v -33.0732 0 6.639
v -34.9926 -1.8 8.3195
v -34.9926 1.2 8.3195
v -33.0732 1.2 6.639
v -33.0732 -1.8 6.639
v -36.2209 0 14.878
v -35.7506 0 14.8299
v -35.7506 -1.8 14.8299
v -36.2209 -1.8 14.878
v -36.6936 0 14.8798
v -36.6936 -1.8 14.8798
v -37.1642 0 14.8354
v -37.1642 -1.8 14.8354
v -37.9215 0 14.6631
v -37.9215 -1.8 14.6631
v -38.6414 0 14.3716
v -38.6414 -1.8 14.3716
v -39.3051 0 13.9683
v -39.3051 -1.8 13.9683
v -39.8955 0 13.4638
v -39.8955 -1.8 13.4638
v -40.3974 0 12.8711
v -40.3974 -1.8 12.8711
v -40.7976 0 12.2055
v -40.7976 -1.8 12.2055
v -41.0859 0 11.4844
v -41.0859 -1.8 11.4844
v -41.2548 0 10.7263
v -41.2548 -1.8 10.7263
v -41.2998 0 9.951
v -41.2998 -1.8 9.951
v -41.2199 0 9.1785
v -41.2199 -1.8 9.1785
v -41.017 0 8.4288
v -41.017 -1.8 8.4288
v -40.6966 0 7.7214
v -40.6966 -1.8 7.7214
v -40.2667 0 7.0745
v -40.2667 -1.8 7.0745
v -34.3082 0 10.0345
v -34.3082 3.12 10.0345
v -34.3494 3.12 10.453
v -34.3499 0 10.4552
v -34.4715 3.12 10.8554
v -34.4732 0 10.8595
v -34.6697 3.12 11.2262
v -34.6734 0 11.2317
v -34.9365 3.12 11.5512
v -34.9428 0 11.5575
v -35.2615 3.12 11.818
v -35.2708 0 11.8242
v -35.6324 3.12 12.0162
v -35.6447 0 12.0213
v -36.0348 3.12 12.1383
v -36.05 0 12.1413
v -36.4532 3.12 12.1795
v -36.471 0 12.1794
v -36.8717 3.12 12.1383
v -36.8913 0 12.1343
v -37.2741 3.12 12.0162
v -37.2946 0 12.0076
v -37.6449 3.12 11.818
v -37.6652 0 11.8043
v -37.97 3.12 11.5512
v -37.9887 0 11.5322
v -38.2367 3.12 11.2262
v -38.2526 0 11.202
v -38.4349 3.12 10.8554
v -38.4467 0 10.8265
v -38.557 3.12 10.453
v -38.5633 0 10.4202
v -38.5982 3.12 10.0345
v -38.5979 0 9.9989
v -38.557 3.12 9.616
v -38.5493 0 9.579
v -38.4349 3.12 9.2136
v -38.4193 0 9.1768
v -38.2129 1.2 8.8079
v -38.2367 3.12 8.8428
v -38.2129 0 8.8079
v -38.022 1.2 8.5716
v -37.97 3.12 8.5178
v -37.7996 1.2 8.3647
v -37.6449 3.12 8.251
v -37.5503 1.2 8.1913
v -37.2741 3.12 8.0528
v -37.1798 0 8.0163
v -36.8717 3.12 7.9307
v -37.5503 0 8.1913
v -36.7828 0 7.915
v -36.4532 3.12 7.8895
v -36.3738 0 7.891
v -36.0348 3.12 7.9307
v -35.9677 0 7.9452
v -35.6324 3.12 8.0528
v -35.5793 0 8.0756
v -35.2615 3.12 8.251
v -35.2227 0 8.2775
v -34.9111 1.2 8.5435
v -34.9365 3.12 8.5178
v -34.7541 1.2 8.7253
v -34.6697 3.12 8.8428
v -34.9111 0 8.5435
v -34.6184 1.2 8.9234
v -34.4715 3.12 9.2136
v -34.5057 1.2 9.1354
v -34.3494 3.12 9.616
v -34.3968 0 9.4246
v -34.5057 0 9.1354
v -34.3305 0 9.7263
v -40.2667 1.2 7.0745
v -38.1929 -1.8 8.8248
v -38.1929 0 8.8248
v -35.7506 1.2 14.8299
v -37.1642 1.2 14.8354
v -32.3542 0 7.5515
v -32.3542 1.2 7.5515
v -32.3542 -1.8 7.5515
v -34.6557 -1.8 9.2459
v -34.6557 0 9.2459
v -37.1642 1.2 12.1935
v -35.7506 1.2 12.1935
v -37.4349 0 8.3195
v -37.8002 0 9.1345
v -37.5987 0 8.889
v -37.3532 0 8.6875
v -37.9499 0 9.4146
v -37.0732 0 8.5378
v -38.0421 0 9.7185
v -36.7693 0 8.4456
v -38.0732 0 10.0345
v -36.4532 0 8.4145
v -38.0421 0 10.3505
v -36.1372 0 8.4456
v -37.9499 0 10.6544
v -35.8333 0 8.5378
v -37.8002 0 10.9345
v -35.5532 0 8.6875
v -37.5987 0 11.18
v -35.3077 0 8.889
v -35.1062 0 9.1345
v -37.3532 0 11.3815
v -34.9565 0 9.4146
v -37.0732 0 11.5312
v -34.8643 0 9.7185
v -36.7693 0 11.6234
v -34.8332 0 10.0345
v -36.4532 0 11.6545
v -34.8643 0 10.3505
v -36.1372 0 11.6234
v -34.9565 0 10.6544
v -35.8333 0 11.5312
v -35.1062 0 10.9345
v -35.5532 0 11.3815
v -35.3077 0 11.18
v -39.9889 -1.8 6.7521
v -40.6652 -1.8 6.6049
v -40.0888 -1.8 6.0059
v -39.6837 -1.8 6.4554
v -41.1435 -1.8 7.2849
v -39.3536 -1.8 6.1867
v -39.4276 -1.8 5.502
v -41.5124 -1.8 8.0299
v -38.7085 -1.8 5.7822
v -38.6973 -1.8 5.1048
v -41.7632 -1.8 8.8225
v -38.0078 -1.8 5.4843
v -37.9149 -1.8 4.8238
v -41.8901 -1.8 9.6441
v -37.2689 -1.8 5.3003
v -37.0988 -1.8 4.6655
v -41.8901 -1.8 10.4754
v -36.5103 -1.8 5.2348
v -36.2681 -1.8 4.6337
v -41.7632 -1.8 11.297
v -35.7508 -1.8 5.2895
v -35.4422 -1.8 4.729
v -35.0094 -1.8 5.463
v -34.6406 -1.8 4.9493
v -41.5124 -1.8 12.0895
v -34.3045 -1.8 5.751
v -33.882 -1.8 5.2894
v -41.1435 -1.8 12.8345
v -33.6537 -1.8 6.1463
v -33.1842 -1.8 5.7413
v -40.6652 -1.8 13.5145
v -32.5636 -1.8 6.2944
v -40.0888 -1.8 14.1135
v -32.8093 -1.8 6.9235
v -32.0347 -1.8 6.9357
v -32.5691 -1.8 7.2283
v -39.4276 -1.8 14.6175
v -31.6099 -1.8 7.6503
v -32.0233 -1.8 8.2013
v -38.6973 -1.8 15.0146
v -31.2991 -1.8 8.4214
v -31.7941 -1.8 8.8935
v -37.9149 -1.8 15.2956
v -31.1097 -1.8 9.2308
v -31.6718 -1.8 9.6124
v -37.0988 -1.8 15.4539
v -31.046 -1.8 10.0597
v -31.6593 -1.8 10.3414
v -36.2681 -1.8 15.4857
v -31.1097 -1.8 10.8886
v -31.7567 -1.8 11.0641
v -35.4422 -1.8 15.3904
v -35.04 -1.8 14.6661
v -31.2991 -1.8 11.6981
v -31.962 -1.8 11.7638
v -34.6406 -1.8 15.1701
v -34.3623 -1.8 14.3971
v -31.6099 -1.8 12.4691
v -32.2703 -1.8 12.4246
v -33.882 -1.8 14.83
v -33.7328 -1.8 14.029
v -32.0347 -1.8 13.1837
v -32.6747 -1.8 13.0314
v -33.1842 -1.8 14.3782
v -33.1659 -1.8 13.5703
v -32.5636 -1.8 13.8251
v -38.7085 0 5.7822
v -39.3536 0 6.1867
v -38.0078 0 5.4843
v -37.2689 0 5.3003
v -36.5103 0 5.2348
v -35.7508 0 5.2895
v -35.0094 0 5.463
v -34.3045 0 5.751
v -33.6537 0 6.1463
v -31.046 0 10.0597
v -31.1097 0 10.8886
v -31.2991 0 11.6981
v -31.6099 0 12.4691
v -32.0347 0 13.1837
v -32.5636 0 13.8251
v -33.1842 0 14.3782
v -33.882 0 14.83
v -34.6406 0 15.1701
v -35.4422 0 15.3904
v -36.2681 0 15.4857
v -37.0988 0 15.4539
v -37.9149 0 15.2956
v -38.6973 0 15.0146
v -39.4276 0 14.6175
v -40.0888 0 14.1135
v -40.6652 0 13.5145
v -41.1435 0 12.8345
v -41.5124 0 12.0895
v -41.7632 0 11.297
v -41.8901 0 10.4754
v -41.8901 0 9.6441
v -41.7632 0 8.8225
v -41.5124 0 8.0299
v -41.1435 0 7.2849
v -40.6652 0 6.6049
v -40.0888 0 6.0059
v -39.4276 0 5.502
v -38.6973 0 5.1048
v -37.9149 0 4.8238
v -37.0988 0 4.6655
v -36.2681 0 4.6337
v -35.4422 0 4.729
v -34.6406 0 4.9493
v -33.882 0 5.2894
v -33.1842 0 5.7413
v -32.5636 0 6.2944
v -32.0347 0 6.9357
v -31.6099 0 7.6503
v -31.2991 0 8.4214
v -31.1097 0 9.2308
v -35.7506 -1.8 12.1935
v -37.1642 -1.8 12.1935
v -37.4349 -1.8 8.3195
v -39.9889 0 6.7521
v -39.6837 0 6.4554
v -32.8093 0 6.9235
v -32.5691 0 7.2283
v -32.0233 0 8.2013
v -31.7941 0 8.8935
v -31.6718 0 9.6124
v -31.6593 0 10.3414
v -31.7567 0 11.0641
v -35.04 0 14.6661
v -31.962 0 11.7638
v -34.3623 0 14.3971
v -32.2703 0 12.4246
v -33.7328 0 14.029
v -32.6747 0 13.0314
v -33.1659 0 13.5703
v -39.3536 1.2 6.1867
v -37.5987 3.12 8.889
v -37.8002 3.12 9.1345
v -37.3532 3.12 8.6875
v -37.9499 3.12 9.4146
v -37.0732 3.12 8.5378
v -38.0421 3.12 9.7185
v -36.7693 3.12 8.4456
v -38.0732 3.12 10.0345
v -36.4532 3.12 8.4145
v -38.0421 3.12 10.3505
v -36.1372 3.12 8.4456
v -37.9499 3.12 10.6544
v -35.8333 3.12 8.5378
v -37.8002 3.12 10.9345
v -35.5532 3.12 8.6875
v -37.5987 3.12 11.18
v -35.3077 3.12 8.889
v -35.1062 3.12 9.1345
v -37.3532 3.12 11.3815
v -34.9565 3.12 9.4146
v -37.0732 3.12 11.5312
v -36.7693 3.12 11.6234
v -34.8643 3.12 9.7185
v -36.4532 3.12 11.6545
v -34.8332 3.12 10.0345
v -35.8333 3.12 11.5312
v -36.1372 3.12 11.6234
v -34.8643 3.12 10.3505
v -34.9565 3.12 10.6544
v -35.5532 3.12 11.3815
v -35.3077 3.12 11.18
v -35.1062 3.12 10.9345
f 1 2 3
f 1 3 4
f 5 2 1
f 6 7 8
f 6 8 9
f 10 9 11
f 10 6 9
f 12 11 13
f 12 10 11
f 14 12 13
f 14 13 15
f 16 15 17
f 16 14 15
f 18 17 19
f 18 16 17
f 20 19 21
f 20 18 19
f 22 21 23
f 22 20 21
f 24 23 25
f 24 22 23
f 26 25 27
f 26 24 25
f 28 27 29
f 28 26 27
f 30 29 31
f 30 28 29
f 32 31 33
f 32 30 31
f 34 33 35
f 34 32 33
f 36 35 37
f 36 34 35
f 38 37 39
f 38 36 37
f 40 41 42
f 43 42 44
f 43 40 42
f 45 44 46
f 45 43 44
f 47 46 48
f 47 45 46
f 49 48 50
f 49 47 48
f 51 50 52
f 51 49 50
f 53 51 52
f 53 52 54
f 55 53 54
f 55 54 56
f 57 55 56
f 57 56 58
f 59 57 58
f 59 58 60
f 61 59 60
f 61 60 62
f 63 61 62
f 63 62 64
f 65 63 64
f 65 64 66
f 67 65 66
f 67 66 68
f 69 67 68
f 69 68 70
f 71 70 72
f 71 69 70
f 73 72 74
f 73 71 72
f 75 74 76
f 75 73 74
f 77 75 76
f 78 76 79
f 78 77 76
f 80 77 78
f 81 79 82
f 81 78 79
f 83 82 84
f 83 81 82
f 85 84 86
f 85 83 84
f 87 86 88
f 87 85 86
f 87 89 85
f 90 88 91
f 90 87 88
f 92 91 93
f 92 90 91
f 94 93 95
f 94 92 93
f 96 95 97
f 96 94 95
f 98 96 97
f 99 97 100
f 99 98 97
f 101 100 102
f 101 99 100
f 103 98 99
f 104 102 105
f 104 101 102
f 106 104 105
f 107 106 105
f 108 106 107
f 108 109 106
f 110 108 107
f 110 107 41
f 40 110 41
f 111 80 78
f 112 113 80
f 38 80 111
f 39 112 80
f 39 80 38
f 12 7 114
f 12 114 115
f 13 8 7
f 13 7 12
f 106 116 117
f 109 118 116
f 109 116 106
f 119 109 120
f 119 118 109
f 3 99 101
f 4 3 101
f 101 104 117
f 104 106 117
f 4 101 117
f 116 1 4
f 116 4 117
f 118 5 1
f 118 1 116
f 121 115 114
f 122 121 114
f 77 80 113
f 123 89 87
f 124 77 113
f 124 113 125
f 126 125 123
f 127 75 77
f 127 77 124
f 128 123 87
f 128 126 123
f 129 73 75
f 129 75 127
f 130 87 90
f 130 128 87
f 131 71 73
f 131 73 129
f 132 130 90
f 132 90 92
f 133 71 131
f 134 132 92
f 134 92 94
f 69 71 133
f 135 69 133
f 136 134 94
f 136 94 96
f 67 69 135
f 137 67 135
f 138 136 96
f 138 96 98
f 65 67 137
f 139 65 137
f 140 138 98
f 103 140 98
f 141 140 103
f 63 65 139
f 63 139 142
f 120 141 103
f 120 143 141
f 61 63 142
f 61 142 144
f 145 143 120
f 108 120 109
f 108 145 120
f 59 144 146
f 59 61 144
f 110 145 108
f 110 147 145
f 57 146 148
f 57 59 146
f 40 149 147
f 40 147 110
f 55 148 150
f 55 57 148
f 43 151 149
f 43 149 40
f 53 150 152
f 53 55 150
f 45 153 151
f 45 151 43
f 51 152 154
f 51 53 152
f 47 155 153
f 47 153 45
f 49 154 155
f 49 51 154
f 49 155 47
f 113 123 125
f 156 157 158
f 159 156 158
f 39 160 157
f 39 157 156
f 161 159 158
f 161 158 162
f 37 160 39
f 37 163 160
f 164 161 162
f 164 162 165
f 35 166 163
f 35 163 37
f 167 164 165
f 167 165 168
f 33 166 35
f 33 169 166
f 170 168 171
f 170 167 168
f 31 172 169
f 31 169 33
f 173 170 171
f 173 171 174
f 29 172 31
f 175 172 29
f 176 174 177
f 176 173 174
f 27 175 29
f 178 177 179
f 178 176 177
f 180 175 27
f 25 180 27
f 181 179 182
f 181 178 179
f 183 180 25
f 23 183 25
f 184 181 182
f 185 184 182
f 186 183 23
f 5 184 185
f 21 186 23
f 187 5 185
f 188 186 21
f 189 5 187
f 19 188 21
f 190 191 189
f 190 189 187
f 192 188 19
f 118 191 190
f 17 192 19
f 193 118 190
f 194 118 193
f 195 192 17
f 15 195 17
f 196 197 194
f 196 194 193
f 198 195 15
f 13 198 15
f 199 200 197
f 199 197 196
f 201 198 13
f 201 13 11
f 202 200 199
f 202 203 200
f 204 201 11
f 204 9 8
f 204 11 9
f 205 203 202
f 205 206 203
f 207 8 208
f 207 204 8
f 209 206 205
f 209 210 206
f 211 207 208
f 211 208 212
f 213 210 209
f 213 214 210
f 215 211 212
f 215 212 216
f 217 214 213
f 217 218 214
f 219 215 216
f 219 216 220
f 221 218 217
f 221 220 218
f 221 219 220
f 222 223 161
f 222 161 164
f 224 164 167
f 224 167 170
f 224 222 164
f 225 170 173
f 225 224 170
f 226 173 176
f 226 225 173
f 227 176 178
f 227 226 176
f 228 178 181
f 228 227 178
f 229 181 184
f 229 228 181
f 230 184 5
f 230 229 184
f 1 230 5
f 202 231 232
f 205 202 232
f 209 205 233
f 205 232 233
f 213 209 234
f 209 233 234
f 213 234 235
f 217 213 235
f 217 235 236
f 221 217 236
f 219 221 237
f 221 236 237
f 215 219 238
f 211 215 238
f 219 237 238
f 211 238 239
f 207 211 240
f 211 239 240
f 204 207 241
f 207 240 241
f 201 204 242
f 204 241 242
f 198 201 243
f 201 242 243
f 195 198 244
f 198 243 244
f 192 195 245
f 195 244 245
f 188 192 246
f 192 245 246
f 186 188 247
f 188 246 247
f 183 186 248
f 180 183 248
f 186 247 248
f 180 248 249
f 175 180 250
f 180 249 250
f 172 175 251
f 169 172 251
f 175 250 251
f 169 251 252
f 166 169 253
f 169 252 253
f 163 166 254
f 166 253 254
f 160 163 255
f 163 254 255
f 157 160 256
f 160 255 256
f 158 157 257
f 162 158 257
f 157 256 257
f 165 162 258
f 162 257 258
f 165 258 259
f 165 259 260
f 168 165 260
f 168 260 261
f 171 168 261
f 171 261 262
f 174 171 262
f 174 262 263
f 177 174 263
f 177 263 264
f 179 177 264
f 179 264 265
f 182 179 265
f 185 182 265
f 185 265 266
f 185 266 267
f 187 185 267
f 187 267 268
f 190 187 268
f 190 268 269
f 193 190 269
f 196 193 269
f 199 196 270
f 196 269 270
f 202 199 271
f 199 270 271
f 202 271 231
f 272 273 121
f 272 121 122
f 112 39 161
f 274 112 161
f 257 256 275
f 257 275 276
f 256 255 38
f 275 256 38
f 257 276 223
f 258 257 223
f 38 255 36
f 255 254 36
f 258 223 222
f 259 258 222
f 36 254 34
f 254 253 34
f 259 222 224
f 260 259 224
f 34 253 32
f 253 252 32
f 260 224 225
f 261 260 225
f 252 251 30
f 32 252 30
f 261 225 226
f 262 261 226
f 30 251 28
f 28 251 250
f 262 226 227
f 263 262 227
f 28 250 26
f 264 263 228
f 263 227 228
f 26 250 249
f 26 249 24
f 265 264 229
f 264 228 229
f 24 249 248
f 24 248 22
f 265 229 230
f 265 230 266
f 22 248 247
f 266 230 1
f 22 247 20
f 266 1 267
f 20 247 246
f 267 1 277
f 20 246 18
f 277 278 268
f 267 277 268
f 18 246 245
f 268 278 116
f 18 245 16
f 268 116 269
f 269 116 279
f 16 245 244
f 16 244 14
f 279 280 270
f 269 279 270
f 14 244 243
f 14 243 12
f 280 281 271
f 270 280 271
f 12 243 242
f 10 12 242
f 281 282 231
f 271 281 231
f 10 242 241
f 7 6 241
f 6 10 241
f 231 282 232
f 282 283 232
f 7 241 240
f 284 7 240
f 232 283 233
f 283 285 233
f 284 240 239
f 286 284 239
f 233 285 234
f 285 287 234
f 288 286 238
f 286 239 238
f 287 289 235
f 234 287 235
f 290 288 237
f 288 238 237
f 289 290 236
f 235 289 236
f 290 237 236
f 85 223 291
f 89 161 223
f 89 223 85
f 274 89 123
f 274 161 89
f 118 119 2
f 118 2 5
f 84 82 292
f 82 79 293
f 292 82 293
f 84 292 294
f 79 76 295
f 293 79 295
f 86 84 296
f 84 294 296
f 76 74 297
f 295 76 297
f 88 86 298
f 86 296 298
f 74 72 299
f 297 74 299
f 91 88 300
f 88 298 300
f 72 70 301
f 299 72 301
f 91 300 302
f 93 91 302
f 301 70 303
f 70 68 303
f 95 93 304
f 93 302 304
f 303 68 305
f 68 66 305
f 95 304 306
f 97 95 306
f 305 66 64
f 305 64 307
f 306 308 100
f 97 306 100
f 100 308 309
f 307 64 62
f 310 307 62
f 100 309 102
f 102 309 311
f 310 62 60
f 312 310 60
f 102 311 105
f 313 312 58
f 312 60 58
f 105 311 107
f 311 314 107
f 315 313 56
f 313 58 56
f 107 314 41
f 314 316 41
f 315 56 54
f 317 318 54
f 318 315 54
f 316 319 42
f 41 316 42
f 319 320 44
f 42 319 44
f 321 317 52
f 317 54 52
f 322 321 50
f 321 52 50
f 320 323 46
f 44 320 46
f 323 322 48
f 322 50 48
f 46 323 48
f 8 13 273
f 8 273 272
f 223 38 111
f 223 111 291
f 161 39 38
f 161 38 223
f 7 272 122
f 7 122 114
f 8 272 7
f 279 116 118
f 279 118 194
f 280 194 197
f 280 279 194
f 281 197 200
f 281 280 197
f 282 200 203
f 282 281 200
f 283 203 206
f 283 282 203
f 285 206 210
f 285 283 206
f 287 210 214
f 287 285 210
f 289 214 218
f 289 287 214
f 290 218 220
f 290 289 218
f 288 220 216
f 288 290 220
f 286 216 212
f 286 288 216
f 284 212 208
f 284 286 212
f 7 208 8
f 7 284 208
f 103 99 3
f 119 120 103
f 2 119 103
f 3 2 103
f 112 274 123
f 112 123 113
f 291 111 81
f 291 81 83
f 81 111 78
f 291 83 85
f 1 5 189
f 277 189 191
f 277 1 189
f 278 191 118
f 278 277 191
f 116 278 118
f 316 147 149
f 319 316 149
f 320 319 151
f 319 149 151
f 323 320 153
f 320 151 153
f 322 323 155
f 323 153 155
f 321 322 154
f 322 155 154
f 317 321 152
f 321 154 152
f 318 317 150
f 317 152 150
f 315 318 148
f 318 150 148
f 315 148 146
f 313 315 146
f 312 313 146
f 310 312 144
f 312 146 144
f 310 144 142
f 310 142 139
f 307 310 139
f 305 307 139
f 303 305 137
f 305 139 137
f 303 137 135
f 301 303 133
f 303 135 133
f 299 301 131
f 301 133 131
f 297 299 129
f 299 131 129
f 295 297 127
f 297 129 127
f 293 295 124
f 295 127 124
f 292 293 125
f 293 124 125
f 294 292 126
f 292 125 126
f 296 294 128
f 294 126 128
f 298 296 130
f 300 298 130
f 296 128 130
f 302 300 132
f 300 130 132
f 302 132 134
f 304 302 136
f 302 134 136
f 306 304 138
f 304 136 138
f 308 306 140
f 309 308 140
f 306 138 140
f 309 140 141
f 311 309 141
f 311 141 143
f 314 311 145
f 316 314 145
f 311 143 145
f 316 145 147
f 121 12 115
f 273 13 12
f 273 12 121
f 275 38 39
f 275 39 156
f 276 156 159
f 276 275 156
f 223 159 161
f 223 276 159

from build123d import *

# Parameters (mm, degrees)
F0_R     = 2.145
F0_R_2   = 1.62
F1_DEPTH = 3.12
F2_R     = 5.43
F2_R_2   = 4.825
F3_DEPTH = 1.8
F5_DEPTH = 3


with BuildPart() as f1:
    # F0 (on Front) → F1 (new body)
    with BuildSketch(Plane.XZ):
        with Locations((-36.4532209933, 10.0345024839)):
            Circle(F0_R)
        with Locations((-36.4532209933, 10.0345024839)):
            Circle(F0_R_2, mode=Mode.SUBTRACT)
    extrude(amount=-F1_DEPTH)



with BuildPart() as f3:
    # F2 (on Front) → F3 (new body)
    with BuildSketch(Plane.XZ):
        with Locations((-36.4760383964, 10.0597171113)):
            Circle(F2_R)
        with Locations((-36.4760383964, 10.0597171113)):
            Circle(F2_R_2, mode=Mode.SUBTRACT)
    extrude(amount=F3_DEPTH)


with BuildPart() as f1_1:
    add(f1.part)

    add(f3.part)  # F5 merges F3
    # F4 (on face) → F5 (join)
    with BuildSketch(Plane.XZ.offset(1.8)):
        Polygon((-35.7505641878, 14.8298651355), (-37.1642453892, 14.8353841993), (-37.1642453892, 12.1934785749), (-35.7505641878, 12.1934785749), align=None)
        Polygon((-38.1928794086, 8.8247712702), (-40.2667231384, 7.0745313237), (-39.3536103606, 6.1867073527), (-37.4349206686, 8.3194654435), align=None)
        Polygon((-32.3542226545, 7.5514786876), (-34.6557348967, 9.2458603904), (-34.9926054478, 8.3194654435), (-33.0732072129, 6.6389913203), align=None)
    extrude(amount=-F5_DEPTH)


solid = f1_1.part
